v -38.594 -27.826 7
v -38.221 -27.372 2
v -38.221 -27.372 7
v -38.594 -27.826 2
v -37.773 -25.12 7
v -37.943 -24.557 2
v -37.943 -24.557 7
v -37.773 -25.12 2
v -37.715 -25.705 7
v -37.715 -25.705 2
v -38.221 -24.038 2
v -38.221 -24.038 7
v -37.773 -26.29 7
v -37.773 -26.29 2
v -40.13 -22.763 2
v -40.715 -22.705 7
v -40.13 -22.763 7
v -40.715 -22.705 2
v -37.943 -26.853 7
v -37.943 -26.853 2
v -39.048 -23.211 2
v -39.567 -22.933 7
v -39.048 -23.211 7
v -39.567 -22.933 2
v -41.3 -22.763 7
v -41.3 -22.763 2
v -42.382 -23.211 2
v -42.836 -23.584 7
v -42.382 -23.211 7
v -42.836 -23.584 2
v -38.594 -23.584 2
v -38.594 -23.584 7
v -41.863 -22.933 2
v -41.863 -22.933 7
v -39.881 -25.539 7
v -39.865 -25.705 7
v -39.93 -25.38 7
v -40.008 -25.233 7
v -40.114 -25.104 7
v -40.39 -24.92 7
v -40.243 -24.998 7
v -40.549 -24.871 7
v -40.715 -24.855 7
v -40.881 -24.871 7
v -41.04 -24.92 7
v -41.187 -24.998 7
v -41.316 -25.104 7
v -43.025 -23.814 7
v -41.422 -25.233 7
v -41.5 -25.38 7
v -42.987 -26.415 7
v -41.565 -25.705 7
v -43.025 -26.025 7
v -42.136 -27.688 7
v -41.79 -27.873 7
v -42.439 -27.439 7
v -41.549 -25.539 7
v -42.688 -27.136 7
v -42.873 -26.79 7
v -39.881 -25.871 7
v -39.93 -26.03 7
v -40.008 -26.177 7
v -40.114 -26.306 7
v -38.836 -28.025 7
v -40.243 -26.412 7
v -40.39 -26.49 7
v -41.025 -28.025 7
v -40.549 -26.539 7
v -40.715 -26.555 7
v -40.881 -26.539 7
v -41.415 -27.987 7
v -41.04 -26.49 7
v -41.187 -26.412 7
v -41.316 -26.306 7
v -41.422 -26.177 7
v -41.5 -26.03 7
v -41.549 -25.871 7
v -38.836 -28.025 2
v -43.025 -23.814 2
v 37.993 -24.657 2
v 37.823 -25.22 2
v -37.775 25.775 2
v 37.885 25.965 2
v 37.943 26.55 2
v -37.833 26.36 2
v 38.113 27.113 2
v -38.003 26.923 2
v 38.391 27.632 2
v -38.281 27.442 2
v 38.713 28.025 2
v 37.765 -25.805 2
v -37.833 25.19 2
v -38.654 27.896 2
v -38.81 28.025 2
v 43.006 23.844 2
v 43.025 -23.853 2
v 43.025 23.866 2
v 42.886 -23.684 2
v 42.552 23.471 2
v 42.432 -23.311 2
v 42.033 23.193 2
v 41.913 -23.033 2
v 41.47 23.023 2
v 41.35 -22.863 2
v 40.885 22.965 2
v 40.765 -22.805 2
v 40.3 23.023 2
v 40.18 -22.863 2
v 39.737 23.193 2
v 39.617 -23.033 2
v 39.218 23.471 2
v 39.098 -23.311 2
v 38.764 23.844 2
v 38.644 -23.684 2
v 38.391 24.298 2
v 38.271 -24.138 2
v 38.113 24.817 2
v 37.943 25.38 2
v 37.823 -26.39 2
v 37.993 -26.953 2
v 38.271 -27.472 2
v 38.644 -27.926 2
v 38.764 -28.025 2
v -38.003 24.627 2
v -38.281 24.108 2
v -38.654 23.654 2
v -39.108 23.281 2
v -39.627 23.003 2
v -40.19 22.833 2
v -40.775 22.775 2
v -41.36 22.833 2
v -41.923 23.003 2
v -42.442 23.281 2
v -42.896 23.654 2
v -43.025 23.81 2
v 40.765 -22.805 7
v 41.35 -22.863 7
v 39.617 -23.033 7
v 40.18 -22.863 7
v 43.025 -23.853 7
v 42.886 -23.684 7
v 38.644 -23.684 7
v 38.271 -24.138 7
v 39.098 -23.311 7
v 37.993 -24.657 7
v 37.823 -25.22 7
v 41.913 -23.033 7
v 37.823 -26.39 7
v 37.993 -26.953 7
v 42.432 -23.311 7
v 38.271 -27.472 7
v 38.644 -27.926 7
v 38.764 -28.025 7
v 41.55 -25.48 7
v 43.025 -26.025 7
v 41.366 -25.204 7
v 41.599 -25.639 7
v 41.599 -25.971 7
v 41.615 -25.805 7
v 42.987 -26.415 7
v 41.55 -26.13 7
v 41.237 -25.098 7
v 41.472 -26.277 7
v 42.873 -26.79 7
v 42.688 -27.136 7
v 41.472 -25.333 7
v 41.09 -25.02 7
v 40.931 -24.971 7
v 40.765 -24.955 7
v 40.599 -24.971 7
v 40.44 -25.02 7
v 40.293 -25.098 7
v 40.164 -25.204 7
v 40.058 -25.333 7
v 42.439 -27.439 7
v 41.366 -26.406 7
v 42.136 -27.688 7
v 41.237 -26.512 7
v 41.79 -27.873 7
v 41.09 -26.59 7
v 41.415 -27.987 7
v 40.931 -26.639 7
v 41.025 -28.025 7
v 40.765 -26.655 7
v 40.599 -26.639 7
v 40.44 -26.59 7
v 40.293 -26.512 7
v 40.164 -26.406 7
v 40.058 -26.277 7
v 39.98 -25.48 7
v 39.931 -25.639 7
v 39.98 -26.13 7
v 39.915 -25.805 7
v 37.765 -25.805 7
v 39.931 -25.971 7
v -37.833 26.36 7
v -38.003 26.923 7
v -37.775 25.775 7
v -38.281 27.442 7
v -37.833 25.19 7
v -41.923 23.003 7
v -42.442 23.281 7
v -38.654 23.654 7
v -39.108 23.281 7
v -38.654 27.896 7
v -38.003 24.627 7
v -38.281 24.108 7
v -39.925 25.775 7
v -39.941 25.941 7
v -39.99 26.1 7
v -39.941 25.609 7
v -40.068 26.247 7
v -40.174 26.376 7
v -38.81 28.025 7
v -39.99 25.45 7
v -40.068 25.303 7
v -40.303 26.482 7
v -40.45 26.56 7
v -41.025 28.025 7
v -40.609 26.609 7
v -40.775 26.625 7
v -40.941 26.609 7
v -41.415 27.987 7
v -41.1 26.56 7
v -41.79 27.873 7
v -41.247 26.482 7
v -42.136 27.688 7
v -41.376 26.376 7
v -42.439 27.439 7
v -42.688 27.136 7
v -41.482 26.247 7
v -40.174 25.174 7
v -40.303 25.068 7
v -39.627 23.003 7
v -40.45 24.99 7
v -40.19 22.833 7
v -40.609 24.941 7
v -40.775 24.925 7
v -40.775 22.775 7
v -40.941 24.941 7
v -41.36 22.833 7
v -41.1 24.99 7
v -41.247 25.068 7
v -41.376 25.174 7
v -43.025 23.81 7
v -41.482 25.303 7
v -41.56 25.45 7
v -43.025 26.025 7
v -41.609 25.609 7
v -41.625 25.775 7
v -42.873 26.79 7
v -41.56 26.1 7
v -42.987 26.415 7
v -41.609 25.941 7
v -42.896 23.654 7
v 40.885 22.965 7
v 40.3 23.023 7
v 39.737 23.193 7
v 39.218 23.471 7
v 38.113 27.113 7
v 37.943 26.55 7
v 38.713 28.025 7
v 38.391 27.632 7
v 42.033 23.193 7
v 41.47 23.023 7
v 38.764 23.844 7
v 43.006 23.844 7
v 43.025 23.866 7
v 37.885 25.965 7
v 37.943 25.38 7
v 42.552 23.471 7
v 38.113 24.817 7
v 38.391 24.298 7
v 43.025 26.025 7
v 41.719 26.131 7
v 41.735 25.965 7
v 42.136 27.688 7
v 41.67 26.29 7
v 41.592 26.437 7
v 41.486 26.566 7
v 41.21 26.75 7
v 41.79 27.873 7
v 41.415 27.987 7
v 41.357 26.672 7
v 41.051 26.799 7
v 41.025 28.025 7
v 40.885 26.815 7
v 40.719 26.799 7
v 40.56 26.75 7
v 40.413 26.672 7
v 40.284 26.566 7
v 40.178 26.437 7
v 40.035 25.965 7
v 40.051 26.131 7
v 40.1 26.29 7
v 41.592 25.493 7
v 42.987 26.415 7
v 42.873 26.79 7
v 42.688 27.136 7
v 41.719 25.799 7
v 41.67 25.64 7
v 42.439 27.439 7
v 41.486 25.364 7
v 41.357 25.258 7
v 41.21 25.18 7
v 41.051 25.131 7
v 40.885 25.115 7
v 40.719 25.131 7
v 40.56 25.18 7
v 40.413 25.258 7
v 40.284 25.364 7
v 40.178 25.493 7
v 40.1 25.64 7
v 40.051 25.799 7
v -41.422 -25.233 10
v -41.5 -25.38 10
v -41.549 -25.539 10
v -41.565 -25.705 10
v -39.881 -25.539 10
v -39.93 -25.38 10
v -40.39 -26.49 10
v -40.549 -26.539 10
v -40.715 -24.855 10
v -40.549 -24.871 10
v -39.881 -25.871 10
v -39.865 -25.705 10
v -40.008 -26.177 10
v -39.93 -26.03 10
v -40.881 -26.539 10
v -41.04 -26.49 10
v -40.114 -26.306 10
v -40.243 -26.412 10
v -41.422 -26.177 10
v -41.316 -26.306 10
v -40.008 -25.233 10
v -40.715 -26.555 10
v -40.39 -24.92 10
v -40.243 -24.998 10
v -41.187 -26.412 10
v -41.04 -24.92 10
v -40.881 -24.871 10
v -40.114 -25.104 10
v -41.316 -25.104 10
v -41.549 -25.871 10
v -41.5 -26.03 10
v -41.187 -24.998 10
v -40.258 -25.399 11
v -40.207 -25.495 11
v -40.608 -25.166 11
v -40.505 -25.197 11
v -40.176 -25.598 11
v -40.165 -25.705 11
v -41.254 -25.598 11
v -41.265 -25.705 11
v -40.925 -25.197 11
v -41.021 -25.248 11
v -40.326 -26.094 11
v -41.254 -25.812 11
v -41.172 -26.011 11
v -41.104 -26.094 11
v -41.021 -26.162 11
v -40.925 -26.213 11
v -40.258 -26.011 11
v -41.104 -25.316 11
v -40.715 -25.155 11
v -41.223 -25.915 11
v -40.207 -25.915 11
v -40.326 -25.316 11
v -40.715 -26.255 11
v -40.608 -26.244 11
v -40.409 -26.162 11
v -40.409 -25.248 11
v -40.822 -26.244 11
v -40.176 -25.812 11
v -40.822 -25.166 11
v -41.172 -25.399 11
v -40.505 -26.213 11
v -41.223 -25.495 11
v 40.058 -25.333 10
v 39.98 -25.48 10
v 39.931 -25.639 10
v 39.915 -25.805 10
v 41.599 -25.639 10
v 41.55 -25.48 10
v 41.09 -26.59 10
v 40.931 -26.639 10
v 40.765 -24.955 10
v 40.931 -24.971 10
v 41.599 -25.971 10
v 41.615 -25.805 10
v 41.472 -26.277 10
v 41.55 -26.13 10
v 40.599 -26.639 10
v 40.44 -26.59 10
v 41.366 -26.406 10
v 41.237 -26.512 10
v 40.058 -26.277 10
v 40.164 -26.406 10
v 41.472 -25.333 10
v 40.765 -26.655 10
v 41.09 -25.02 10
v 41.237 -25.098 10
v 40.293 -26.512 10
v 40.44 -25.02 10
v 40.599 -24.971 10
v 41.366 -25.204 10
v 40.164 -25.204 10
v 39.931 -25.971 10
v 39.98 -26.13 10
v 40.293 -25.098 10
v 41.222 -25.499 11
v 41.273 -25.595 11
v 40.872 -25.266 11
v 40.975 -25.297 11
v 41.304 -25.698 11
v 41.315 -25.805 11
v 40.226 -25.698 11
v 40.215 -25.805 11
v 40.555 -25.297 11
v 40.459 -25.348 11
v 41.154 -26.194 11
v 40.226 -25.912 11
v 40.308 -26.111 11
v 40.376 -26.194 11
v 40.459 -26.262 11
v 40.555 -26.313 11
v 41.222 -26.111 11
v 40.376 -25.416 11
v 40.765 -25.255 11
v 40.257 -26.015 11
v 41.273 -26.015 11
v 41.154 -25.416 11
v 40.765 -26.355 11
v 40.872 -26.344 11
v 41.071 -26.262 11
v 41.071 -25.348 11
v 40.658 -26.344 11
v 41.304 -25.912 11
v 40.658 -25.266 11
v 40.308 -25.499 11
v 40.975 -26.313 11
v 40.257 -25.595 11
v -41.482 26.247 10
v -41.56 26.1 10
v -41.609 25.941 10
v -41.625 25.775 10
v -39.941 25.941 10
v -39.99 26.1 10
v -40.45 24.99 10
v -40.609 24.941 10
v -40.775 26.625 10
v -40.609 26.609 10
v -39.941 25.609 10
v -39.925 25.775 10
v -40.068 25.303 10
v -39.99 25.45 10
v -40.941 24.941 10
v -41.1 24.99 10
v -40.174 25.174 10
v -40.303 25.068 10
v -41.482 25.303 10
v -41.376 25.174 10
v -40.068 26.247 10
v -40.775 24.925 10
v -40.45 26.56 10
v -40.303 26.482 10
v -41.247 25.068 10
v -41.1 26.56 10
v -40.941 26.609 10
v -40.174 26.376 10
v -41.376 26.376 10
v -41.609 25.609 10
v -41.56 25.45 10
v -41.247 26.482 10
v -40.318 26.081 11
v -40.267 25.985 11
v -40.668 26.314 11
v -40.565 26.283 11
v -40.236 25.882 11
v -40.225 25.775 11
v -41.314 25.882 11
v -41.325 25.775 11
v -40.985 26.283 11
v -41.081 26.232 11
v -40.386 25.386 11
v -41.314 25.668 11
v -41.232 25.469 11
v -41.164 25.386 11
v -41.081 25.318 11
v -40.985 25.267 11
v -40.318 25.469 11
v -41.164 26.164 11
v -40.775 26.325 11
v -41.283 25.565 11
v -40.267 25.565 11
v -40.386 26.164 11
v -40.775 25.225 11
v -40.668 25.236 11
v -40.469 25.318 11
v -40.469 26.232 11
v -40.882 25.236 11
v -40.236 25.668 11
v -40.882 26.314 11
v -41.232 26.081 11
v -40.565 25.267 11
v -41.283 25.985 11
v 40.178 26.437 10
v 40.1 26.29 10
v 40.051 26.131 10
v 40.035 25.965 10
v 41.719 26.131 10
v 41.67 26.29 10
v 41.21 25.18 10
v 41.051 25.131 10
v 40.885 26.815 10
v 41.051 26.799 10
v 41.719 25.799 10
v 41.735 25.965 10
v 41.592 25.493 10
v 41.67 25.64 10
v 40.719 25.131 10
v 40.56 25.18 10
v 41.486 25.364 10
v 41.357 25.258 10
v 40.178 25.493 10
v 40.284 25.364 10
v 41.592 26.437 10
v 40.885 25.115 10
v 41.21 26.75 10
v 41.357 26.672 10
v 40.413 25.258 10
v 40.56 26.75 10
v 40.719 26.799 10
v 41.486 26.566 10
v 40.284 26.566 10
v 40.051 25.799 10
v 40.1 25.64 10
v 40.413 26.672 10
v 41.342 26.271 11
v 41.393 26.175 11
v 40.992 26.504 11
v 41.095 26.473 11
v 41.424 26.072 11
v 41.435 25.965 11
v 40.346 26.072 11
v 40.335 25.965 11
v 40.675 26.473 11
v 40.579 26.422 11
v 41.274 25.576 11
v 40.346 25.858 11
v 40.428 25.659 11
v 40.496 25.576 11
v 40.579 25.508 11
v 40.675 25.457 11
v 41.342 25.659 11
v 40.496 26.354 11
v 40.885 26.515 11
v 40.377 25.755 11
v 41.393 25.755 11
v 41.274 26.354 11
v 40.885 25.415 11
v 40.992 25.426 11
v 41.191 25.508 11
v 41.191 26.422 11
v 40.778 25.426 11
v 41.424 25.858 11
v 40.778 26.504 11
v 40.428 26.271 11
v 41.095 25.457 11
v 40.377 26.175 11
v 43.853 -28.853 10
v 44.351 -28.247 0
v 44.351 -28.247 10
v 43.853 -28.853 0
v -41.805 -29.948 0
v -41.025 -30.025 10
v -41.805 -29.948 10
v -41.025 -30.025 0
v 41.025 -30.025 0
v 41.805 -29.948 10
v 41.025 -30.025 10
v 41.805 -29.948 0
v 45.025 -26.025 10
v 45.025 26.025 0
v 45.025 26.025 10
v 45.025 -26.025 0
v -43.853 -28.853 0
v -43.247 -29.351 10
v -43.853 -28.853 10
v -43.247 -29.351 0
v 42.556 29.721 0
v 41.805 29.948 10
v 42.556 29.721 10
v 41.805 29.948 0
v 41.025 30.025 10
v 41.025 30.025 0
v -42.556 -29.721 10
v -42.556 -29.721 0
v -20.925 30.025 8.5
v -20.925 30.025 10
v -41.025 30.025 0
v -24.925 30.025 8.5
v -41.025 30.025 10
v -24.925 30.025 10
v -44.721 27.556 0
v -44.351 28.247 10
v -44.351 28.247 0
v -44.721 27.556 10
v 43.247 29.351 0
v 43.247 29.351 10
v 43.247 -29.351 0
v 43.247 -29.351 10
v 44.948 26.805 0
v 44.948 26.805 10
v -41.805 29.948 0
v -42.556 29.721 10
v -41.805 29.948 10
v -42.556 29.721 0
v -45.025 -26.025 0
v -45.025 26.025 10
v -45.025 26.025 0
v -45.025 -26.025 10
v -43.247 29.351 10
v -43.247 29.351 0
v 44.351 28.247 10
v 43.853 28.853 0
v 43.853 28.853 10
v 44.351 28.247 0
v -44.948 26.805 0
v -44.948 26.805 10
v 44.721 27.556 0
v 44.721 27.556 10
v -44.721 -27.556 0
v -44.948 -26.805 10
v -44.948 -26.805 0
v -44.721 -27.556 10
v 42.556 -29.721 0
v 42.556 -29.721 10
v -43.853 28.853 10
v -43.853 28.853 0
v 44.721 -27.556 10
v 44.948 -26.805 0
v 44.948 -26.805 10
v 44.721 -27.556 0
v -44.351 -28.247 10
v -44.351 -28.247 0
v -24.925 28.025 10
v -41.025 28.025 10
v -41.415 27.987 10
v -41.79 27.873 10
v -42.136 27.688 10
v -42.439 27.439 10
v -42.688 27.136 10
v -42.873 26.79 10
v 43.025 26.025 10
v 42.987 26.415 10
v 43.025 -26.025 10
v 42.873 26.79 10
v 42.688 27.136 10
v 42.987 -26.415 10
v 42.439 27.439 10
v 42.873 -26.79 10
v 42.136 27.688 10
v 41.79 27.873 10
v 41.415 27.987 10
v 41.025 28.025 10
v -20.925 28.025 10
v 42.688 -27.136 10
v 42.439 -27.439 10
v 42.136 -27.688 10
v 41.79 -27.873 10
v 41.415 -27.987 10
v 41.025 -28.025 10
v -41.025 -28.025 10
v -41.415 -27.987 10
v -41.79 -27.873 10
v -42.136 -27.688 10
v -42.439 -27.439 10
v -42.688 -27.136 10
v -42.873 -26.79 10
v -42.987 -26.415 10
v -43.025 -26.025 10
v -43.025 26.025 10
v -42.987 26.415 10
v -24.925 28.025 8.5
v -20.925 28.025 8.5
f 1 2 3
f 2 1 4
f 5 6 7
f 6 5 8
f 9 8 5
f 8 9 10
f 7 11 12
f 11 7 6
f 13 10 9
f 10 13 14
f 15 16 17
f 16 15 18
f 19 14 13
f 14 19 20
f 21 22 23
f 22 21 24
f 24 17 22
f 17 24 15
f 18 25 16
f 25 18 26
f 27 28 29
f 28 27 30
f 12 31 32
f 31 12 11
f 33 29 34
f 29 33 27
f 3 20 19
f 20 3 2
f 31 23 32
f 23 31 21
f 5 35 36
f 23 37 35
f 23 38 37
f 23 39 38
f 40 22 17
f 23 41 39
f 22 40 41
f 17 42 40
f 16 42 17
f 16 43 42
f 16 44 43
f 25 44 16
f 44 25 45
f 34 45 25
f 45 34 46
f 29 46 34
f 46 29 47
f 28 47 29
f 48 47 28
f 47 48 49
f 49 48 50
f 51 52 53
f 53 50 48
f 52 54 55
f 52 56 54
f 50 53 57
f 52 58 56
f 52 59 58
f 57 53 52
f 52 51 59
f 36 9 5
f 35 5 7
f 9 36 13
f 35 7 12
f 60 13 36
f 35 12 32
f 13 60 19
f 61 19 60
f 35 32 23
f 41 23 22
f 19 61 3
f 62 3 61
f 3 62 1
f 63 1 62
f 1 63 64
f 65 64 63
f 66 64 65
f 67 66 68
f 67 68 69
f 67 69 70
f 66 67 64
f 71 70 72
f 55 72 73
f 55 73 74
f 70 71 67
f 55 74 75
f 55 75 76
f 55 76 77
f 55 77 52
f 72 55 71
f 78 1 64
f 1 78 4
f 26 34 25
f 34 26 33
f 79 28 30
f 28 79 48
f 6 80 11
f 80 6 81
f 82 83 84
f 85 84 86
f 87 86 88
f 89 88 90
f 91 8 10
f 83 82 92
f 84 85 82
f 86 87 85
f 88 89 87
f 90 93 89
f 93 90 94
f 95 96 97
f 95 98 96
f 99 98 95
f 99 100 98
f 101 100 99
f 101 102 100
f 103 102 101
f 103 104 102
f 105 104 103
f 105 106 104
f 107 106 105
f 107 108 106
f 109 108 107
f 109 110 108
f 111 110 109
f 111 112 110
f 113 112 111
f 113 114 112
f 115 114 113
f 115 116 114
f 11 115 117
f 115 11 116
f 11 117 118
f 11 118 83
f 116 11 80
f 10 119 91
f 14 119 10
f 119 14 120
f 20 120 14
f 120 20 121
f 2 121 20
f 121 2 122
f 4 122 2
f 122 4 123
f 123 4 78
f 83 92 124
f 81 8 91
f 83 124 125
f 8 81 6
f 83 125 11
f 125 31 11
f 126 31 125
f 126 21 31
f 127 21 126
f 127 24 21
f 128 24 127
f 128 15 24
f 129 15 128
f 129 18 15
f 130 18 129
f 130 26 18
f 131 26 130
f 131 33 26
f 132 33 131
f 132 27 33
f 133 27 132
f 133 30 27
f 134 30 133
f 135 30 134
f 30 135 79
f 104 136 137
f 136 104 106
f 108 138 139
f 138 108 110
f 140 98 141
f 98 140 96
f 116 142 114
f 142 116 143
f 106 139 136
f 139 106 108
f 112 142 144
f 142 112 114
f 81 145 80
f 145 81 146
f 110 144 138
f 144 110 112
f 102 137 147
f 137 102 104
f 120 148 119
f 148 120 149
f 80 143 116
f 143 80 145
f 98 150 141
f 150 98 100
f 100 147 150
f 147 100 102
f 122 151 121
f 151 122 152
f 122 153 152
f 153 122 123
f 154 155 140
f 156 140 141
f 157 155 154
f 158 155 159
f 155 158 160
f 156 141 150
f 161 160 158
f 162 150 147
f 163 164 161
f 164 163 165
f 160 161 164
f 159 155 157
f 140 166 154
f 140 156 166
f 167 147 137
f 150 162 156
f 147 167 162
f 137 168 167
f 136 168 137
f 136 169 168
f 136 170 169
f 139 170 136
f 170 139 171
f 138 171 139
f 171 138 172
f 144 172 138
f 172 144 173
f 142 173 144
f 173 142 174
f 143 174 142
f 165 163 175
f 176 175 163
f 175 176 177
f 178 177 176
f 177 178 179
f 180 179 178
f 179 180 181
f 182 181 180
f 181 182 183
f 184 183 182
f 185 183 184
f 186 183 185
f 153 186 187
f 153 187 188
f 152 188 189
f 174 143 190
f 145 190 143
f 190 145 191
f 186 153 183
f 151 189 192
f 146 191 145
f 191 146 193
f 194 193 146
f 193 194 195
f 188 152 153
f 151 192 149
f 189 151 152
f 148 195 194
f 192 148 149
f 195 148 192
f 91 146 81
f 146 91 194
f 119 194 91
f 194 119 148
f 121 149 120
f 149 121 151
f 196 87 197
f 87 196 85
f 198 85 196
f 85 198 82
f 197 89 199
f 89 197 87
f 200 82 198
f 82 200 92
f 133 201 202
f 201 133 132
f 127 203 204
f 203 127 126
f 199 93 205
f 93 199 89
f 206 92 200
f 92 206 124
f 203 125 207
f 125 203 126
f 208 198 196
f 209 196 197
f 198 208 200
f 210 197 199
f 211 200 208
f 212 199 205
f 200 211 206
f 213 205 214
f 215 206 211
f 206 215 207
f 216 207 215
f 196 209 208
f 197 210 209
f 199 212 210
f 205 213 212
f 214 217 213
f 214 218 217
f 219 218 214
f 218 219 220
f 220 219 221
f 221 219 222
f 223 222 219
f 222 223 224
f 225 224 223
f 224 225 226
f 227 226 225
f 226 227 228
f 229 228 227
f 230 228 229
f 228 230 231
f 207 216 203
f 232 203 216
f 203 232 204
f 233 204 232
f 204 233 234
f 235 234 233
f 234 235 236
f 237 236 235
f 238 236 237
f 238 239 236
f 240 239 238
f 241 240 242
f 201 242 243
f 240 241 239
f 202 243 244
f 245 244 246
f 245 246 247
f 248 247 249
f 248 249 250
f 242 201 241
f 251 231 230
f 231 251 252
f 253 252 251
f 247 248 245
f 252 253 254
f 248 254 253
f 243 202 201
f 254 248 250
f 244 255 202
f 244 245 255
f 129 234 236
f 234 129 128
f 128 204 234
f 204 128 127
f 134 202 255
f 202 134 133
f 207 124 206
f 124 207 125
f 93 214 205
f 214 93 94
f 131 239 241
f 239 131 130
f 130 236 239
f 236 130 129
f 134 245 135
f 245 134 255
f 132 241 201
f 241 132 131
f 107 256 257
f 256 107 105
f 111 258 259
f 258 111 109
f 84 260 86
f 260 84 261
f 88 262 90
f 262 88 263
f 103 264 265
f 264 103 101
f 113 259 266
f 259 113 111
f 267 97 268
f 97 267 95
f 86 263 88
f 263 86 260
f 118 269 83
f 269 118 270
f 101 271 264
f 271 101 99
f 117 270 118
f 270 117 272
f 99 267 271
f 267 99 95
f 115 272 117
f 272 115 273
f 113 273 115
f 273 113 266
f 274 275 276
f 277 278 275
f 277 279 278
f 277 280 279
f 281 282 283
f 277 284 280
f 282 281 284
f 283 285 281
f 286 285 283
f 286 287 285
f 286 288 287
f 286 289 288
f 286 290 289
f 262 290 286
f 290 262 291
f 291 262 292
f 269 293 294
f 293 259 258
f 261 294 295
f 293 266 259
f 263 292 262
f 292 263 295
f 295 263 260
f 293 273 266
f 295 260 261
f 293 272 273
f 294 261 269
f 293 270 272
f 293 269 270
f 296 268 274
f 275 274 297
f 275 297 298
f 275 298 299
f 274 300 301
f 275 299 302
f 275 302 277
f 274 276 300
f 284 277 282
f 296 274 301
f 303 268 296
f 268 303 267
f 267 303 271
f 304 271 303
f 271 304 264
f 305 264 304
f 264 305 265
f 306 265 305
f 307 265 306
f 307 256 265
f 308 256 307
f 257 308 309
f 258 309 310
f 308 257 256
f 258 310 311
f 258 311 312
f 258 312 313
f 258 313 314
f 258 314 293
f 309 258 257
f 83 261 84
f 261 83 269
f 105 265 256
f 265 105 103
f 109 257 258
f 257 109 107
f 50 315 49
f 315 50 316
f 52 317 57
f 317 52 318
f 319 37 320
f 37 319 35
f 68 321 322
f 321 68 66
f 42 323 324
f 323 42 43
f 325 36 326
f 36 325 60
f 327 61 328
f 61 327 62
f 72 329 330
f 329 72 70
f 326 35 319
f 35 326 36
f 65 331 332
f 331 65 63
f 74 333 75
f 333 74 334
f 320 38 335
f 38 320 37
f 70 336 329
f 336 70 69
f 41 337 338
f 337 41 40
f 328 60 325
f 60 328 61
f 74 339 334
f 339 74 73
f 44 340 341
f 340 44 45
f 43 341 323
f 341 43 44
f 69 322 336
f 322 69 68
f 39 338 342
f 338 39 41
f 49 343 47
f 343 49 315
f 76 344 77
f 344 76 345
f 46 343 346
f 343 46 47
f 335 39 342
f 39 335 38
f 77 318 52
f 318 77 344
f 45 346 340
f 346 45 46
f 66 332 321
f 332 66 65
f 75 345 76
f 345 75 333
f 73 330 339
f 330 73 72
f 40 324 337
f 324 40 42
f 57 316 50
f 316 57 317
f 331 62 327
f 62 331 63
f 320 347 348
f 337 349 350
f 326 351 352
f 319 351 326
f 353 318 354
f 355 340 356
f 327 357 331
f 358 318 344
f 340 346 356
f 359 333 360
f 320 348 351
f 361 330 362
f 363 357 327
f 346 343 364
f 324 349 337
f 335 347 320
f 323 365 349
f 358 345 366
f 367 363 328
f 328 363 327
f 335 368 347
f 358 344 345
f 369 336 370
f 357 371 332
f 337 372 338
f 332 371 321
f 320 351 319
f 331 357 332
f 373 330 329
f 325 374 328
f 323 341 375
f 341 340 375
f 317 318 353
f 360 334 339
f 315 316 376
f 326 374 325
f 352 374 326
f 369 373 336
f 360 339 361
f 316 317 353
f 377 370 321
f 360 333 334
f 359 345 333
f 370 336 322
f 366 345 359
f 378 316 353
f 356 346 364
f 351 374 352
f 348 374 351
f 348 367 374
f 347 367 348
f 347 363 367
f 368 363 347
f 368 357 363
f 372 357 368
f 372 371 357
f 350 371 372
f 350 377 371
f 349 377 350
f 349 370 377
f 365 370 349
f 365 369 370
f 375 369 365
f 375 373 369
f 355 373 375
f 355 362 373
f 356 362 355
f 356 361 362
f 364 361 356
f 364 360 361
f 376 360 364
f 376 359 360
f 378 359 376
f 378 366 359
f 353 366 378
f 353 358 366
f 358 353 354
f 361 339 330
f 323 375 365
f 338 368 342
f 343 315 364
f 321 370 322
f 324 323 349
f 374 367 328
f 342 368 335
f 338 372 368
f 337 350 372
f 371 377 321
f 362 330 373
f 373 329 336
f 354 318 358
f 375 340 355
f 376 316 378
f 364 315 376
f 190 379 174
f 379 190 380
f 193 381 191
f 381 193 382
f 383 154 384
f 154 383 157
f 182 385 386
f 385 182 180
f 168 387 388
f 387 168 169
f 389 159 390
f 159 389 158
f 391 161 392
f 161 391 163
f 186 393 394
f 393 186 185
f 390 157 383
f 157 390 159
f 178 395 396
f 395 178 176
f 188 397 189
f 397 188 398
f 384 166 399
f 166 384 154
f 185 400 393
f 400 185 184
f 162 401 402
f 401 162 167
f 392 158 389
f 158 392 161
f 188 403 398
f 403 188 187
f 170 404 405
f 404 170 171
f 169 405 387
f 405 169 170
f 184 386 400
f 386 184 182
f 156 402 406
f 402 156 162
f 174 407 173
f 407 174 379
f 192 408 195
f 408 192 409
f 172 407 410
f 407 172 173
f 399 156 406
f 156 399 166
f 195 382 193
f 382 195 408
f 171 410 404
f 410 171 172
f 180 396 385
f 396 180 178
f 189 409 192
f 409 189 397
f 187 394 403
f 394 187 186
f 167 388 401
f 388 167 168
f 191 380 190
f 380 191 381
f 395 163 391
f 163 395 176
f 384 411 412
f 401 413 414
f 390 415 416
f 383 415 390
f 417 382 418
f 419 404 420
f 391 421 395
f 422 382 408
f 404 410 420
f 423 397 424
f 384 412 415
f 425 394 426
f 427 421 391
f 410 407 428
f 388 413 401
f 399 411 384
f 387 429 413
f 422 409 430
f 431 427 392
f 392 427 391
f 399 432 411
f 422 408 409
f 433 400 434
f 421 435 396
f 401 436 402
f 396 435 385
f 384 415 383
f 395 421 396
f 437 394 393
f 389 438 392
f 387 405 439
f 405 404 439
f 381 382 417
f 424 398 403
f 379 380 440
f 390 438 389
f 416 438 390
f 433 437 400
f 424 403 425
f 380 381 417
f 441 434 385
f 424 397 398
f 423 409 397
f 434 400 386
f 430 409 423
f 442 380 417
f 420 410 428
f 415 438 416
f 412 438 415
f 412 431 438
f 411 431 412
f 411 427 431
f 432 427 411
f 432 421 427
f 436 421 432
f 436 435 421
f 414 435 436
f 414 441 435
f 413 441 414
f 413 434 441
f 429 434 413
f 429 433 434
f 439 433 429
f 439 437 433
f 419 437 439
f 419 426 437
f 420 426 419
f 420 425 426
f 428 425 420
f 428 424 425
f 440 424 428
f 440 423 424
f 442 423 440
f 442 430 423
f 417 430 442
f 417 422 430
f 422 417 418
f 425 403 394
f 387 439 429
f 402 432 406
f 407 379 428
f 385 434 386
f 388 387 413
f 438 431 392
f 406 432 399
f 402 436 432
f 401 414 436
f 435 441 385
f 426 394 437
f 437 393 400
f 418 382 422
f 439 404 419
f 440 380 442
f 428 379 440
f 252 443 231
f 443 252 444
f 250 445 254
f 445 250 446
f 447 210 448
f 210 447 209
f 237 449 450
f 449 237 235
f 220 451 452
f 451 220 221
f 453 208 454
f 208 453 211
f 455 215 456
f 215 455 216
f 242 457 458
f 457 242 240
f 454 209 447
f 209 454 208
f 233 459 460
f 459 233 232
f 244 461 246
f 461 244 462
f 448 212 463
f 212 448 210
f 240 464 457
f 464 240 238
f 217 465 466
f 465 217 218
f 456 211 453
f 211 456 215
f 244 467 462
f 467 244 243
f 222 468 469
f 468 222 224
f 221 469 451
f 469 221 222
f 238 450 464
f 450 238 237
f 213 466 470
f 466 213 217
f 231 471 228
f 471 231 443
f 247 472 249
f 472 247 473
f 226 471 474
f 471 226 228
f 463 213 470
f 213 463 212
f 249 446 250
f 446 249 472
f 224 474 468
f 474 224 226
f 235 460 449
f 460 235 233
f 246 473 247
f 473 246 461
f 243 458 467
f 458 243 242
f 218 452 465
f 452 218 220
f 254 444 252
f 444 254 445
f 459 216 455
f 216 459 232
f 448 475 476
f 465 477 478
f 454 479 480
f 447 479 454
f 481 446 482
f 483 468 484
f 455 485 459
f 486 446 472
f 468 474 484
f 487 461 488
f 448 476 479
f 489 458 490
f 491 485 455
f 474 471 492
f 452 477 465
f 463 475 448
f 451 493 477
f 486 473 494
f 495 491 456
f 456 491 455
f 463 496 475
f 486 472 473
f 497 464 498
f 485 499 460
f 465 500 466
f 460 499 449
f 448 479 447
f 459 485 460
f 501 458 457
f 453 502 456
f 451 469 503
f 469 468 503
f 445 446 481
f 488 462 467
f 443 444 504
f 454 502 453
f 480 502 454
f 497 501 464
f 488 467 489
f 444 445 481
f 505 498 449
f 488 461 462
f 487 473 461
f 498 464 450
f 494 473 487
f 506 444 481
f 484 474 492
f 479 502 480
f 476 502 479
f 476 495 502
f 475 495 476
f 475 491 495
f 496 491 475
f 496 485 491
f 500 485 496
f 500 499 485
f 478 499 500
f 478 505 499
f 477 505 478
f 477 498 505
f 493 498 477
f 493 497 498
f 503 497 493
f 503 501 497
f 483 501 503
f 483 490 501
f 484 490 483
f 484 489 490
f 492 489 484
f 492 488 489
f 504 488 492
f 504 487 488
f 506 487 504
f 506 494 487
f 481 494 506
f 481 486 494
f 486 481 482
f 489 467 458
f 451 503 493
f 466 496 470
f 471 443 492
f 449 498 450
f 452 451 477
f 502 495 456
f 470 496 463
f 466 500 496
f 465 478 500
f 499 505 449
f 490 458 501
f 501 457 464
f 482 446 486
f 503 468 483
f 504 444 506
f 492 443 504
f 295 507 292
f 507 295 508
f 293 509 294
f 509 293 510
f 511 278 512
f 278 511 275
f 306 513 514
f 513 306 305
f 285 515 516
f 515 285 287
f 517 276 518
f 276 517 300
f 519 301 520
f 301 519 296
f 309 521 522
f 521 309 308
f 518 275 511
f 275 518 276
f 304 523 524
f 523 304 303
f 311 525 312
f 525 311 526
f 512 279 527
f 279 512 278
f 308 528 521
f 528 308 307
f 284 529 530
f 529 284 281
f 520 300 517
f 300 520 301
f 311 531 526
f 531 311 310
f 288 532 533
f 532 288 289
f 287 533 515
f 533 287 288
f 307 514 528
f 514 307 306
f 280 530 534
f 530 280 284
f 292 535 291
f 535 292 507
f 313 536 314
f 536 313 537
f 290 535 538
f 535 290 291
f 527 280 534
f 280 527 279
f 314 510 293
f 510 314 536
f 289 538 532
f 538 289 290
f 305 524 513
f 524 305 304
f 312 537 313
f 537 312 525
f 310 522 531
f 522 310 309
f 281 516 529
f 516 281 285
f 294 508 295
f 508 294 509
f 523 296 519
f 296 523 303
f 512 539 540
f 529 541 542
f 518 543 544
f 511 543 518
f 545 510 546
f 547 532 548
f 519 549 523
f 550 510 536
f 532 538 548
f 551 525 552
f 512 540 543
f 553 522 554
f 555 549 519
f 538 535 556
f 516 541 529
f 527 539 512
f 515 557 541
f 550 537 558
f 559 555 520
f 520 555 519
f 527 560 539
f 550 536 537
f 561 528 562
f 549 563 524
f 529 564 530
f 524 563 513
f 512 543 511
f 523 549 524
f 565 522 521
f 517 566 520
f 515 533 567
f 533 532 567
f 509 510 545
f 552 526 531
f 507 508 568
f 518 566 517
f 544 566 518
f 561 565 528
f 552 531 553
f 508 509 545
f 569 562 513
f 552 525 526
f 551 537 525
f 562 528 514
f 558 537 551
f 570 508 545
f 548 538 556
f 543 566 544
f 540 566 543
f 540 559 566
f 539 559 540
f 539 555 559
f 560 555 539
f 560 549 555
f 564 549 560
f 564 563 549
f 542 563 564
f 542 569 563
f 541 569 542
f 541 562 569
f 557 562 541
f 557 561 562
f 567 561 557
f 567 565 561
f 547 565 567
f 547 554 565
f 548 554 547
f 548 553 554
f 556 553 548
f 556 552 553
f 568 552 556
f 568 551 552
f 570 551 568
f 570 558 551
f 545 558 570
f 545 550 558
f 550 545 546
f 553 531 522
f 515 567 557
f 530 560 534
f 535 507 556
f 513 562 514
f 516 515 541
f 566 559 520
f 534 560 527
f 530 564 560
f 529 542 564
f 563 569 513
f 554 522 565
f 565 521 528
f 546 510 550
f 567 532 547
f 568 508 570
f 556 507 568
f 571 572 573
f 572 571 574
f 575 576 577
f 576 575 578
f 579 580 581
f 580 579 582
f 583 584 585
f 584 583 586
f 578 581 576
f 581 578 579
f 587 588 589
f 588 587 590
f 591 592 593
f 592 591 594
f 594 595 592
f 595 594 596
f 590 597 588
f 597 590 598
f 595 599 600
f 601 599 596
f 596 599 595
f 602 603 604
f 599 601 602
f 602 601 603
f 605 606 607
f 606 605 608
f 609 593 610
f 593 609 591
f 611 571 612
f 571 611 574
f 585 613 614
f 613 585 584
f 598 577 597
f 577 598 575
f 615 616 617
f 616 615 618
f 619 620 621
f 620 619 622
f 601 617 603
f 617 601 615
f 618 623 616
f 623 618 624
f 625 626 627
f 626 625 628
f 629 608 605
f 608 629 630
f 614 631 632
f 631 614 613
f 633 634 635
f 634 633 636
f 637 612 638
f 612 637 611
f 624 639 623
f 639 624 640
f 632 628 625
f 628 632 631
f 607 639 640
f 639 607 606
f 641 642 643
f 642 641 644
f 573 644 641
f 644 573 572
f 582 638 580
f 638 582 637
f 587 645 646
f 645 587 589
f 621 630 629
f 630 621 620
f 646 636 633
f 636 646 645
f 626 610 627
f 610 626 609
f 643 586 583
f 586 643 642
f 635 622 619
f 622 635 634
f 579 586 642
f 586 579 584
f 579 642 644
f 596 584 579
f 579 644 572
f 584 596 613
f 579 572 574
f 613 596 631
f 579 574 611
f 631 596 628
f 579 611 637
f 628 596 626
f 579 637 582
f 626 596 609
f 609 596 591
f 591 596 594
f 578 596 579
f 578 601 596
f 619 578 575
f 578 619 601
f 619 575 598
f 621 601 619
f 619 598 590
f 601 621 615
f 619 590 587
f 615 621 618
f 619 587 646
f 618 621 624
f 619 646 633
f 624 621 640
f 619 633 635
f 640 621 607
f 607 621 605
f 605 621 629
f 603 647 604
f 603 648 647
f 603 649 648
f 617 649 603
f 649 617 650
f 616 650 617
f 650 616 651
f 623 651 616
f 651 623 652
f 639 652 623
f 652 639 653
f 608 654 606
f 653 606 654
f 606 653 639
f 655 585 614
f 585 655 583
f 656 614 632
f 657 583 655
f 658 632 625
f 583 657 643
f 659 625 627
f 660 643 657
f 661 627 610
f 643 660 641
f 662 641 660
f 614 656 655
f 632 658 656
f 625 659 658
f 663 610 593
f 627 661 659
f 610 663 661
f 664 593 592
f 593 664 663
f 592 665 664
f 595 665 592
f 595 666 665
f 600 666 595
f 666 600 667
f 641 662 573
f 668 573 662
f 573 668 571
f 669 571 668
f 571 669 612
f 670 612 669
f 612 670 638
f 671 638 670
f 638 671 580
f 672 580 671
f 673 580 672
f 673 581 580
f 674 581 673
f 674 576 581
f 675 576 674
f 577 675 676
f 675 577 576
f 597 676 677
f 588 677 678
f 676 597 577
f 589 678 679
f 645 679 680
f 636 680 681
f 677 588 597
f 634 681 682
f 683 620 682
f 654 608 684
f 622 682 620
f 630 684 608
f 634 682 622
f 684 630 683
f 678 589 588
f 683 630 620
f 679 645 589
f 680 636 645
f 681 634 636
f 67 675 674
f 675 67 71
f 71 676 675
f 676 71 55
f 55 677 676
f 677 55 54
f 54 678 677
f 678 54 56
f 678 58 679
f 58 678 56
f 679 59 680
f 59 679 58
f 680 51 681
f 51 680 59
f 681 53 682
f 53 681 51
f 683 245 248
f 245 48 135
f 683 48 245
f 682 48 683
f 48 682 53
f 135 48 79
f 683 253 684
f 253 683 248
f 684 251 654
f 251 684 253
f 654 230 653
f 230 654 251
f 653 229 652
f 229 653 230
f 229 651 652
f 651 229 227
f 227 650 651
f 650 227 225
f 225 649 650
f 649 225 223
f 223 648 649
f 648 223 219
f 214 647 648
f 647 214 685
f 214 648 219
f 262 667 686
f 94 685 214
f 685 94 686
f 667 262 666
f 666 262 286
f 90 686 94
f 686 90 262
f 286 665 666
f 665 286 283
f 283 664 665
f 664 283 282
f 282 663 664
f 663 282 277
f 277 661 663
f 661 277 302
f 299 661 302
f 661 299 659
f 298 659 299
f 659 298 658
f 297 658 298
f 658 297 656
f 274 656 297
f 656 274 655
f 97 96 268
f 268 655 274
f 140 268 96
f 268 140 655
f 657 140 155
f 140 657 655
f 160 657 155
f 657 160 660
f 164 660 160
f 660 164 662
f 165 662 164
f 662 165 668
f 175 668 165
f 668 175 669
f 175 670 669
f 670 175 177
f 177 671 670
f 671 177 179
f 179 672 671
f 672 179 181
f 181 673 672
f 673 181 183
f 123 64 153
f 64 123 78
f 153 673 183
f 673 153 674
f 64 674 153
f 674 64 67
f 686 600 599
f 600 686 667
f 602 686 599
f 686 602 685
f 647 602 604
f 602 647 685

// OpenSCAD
// Breezy v4 Tray
// Shallow tray to hold board and protect from 220V contacts
// Board: 85.05mm x 55.05mm, 2mm corner radius (v4, measured from KiCad source)
// NOTE: v4 mounting holes are 2.1mm (not 3.2mm as in v3)

/* [Board Dimensions] */
board_width = 85.05;
board_height = 55.05;
board_corner_radius = 2;
board_thickness = 1.6;

/* [Mounting Holes] */
hole_diameter = 2.1;  // v4 boards; v3 was 3.2
standoff_height = 5;
standoff_diameter = 6;

/* [Pegs] */
use_pegs = true;
peg_diameter = 1.7;  // slightly under 2.1mm hole; fragile at this size -
                     // if pegs snap, set use_pegs=false and use M2 screws
peg_height = 4;      // above standoff

/* [Tray Parameters] */
wall_thickness = 2;
base_thickness = 2;
wall_height = 8;  // low walls, just enough to hold board
clearance = 0.5;  // FDM pockets print smaller than modeled; 0.3 was too tight

/* [Rendering] */
$fn = 32;

// Calculated dimensions
tray_width = board_width + 2*wall_thickness + 2*clearance;
tray_height = board_height + 2*wall_thickness + 2*clearance;

// Mounting hole positions (from board origin, x from left / y from bottom)
// Explicit coordinates measured from the v4 KiCad board - the four holes are
// NOT perfectly symmetric (insets vary 1.56-1.82mm), so no computed inset.
holes = [
    [1.81, 1.82],
    [83.29, 1.72],
    [1.75, 53.30],
    [83.41, 53.49]
];

module rounded_rect(w, h, r) {
    offset(r) offset(-r) square([w, h], center=true);
}

module peg() {
    // straight shank + tapered tip for lead-in
    cylinder(h=peg_height - 1, d=peg_diameter);
    translate([0, 0, peg_height - 1])
        cylinder(h=1, d1=peg_diameter, d2=peg_diameter - 0.6);
}

module tray() {
    difference() {
        union() {
            // Base plate
            linear_extrude(base_thickness) {
                rounded_rect(tray_width, tray_height, board_corner_radius + wall_thickness);
            }

            // Low walls
            linear_extrude(base_thickness + wall_height) {
                difference() {
                    rounded_rect(tray_width, tray_height, board_corner_radius + wall_thickness);
                    rounded_rect(board_width + 2*clearance, board_height + 2*clearance, board_corner_radius);
                }
            }

            // Standoffs
            for (hole = holes) {
                translate([hole[0] - board_width/2, hole[1] - board_height/2, base_thickness]) {
                    cylinder(h=standoff_height, d=standoff_diameter);
                }
            }

            // Pegs on standoffs
            if (use_pegs) {
                for (hole = holes) {
                    translate([hole[0] - board_width/2, hole[1] - board_height/2, base_thickness + standoff_height]) {
                        peg();
                    }
                }
            }
        }

        // Orientation notch in the wall top, aligned with the AC screw terminal
        // (J5). Insert the board with its screw terminal at the notch - the
        // mounting holes are slightly asymmetric, so 180° insertion binds.
        translate([19.6 - board_width/2 - 2, board_height/2 + clearance - 0.01,
                   base_thickness + wall_height - 1.5]) {
            cube([4, wall_thickness + 2, 3]);
        }

        // Screw holes (only if not using pegs)
        if (!use_pegs) {
            for (hole = holes) {
                translate([hole[0] - board_width/2, hole[1] - board_height/2, -1]) {
                    cylinder(h=base_thickness + standoff_height + 2, d=2.5);
                }
            }
        }
    }
}

tray();
